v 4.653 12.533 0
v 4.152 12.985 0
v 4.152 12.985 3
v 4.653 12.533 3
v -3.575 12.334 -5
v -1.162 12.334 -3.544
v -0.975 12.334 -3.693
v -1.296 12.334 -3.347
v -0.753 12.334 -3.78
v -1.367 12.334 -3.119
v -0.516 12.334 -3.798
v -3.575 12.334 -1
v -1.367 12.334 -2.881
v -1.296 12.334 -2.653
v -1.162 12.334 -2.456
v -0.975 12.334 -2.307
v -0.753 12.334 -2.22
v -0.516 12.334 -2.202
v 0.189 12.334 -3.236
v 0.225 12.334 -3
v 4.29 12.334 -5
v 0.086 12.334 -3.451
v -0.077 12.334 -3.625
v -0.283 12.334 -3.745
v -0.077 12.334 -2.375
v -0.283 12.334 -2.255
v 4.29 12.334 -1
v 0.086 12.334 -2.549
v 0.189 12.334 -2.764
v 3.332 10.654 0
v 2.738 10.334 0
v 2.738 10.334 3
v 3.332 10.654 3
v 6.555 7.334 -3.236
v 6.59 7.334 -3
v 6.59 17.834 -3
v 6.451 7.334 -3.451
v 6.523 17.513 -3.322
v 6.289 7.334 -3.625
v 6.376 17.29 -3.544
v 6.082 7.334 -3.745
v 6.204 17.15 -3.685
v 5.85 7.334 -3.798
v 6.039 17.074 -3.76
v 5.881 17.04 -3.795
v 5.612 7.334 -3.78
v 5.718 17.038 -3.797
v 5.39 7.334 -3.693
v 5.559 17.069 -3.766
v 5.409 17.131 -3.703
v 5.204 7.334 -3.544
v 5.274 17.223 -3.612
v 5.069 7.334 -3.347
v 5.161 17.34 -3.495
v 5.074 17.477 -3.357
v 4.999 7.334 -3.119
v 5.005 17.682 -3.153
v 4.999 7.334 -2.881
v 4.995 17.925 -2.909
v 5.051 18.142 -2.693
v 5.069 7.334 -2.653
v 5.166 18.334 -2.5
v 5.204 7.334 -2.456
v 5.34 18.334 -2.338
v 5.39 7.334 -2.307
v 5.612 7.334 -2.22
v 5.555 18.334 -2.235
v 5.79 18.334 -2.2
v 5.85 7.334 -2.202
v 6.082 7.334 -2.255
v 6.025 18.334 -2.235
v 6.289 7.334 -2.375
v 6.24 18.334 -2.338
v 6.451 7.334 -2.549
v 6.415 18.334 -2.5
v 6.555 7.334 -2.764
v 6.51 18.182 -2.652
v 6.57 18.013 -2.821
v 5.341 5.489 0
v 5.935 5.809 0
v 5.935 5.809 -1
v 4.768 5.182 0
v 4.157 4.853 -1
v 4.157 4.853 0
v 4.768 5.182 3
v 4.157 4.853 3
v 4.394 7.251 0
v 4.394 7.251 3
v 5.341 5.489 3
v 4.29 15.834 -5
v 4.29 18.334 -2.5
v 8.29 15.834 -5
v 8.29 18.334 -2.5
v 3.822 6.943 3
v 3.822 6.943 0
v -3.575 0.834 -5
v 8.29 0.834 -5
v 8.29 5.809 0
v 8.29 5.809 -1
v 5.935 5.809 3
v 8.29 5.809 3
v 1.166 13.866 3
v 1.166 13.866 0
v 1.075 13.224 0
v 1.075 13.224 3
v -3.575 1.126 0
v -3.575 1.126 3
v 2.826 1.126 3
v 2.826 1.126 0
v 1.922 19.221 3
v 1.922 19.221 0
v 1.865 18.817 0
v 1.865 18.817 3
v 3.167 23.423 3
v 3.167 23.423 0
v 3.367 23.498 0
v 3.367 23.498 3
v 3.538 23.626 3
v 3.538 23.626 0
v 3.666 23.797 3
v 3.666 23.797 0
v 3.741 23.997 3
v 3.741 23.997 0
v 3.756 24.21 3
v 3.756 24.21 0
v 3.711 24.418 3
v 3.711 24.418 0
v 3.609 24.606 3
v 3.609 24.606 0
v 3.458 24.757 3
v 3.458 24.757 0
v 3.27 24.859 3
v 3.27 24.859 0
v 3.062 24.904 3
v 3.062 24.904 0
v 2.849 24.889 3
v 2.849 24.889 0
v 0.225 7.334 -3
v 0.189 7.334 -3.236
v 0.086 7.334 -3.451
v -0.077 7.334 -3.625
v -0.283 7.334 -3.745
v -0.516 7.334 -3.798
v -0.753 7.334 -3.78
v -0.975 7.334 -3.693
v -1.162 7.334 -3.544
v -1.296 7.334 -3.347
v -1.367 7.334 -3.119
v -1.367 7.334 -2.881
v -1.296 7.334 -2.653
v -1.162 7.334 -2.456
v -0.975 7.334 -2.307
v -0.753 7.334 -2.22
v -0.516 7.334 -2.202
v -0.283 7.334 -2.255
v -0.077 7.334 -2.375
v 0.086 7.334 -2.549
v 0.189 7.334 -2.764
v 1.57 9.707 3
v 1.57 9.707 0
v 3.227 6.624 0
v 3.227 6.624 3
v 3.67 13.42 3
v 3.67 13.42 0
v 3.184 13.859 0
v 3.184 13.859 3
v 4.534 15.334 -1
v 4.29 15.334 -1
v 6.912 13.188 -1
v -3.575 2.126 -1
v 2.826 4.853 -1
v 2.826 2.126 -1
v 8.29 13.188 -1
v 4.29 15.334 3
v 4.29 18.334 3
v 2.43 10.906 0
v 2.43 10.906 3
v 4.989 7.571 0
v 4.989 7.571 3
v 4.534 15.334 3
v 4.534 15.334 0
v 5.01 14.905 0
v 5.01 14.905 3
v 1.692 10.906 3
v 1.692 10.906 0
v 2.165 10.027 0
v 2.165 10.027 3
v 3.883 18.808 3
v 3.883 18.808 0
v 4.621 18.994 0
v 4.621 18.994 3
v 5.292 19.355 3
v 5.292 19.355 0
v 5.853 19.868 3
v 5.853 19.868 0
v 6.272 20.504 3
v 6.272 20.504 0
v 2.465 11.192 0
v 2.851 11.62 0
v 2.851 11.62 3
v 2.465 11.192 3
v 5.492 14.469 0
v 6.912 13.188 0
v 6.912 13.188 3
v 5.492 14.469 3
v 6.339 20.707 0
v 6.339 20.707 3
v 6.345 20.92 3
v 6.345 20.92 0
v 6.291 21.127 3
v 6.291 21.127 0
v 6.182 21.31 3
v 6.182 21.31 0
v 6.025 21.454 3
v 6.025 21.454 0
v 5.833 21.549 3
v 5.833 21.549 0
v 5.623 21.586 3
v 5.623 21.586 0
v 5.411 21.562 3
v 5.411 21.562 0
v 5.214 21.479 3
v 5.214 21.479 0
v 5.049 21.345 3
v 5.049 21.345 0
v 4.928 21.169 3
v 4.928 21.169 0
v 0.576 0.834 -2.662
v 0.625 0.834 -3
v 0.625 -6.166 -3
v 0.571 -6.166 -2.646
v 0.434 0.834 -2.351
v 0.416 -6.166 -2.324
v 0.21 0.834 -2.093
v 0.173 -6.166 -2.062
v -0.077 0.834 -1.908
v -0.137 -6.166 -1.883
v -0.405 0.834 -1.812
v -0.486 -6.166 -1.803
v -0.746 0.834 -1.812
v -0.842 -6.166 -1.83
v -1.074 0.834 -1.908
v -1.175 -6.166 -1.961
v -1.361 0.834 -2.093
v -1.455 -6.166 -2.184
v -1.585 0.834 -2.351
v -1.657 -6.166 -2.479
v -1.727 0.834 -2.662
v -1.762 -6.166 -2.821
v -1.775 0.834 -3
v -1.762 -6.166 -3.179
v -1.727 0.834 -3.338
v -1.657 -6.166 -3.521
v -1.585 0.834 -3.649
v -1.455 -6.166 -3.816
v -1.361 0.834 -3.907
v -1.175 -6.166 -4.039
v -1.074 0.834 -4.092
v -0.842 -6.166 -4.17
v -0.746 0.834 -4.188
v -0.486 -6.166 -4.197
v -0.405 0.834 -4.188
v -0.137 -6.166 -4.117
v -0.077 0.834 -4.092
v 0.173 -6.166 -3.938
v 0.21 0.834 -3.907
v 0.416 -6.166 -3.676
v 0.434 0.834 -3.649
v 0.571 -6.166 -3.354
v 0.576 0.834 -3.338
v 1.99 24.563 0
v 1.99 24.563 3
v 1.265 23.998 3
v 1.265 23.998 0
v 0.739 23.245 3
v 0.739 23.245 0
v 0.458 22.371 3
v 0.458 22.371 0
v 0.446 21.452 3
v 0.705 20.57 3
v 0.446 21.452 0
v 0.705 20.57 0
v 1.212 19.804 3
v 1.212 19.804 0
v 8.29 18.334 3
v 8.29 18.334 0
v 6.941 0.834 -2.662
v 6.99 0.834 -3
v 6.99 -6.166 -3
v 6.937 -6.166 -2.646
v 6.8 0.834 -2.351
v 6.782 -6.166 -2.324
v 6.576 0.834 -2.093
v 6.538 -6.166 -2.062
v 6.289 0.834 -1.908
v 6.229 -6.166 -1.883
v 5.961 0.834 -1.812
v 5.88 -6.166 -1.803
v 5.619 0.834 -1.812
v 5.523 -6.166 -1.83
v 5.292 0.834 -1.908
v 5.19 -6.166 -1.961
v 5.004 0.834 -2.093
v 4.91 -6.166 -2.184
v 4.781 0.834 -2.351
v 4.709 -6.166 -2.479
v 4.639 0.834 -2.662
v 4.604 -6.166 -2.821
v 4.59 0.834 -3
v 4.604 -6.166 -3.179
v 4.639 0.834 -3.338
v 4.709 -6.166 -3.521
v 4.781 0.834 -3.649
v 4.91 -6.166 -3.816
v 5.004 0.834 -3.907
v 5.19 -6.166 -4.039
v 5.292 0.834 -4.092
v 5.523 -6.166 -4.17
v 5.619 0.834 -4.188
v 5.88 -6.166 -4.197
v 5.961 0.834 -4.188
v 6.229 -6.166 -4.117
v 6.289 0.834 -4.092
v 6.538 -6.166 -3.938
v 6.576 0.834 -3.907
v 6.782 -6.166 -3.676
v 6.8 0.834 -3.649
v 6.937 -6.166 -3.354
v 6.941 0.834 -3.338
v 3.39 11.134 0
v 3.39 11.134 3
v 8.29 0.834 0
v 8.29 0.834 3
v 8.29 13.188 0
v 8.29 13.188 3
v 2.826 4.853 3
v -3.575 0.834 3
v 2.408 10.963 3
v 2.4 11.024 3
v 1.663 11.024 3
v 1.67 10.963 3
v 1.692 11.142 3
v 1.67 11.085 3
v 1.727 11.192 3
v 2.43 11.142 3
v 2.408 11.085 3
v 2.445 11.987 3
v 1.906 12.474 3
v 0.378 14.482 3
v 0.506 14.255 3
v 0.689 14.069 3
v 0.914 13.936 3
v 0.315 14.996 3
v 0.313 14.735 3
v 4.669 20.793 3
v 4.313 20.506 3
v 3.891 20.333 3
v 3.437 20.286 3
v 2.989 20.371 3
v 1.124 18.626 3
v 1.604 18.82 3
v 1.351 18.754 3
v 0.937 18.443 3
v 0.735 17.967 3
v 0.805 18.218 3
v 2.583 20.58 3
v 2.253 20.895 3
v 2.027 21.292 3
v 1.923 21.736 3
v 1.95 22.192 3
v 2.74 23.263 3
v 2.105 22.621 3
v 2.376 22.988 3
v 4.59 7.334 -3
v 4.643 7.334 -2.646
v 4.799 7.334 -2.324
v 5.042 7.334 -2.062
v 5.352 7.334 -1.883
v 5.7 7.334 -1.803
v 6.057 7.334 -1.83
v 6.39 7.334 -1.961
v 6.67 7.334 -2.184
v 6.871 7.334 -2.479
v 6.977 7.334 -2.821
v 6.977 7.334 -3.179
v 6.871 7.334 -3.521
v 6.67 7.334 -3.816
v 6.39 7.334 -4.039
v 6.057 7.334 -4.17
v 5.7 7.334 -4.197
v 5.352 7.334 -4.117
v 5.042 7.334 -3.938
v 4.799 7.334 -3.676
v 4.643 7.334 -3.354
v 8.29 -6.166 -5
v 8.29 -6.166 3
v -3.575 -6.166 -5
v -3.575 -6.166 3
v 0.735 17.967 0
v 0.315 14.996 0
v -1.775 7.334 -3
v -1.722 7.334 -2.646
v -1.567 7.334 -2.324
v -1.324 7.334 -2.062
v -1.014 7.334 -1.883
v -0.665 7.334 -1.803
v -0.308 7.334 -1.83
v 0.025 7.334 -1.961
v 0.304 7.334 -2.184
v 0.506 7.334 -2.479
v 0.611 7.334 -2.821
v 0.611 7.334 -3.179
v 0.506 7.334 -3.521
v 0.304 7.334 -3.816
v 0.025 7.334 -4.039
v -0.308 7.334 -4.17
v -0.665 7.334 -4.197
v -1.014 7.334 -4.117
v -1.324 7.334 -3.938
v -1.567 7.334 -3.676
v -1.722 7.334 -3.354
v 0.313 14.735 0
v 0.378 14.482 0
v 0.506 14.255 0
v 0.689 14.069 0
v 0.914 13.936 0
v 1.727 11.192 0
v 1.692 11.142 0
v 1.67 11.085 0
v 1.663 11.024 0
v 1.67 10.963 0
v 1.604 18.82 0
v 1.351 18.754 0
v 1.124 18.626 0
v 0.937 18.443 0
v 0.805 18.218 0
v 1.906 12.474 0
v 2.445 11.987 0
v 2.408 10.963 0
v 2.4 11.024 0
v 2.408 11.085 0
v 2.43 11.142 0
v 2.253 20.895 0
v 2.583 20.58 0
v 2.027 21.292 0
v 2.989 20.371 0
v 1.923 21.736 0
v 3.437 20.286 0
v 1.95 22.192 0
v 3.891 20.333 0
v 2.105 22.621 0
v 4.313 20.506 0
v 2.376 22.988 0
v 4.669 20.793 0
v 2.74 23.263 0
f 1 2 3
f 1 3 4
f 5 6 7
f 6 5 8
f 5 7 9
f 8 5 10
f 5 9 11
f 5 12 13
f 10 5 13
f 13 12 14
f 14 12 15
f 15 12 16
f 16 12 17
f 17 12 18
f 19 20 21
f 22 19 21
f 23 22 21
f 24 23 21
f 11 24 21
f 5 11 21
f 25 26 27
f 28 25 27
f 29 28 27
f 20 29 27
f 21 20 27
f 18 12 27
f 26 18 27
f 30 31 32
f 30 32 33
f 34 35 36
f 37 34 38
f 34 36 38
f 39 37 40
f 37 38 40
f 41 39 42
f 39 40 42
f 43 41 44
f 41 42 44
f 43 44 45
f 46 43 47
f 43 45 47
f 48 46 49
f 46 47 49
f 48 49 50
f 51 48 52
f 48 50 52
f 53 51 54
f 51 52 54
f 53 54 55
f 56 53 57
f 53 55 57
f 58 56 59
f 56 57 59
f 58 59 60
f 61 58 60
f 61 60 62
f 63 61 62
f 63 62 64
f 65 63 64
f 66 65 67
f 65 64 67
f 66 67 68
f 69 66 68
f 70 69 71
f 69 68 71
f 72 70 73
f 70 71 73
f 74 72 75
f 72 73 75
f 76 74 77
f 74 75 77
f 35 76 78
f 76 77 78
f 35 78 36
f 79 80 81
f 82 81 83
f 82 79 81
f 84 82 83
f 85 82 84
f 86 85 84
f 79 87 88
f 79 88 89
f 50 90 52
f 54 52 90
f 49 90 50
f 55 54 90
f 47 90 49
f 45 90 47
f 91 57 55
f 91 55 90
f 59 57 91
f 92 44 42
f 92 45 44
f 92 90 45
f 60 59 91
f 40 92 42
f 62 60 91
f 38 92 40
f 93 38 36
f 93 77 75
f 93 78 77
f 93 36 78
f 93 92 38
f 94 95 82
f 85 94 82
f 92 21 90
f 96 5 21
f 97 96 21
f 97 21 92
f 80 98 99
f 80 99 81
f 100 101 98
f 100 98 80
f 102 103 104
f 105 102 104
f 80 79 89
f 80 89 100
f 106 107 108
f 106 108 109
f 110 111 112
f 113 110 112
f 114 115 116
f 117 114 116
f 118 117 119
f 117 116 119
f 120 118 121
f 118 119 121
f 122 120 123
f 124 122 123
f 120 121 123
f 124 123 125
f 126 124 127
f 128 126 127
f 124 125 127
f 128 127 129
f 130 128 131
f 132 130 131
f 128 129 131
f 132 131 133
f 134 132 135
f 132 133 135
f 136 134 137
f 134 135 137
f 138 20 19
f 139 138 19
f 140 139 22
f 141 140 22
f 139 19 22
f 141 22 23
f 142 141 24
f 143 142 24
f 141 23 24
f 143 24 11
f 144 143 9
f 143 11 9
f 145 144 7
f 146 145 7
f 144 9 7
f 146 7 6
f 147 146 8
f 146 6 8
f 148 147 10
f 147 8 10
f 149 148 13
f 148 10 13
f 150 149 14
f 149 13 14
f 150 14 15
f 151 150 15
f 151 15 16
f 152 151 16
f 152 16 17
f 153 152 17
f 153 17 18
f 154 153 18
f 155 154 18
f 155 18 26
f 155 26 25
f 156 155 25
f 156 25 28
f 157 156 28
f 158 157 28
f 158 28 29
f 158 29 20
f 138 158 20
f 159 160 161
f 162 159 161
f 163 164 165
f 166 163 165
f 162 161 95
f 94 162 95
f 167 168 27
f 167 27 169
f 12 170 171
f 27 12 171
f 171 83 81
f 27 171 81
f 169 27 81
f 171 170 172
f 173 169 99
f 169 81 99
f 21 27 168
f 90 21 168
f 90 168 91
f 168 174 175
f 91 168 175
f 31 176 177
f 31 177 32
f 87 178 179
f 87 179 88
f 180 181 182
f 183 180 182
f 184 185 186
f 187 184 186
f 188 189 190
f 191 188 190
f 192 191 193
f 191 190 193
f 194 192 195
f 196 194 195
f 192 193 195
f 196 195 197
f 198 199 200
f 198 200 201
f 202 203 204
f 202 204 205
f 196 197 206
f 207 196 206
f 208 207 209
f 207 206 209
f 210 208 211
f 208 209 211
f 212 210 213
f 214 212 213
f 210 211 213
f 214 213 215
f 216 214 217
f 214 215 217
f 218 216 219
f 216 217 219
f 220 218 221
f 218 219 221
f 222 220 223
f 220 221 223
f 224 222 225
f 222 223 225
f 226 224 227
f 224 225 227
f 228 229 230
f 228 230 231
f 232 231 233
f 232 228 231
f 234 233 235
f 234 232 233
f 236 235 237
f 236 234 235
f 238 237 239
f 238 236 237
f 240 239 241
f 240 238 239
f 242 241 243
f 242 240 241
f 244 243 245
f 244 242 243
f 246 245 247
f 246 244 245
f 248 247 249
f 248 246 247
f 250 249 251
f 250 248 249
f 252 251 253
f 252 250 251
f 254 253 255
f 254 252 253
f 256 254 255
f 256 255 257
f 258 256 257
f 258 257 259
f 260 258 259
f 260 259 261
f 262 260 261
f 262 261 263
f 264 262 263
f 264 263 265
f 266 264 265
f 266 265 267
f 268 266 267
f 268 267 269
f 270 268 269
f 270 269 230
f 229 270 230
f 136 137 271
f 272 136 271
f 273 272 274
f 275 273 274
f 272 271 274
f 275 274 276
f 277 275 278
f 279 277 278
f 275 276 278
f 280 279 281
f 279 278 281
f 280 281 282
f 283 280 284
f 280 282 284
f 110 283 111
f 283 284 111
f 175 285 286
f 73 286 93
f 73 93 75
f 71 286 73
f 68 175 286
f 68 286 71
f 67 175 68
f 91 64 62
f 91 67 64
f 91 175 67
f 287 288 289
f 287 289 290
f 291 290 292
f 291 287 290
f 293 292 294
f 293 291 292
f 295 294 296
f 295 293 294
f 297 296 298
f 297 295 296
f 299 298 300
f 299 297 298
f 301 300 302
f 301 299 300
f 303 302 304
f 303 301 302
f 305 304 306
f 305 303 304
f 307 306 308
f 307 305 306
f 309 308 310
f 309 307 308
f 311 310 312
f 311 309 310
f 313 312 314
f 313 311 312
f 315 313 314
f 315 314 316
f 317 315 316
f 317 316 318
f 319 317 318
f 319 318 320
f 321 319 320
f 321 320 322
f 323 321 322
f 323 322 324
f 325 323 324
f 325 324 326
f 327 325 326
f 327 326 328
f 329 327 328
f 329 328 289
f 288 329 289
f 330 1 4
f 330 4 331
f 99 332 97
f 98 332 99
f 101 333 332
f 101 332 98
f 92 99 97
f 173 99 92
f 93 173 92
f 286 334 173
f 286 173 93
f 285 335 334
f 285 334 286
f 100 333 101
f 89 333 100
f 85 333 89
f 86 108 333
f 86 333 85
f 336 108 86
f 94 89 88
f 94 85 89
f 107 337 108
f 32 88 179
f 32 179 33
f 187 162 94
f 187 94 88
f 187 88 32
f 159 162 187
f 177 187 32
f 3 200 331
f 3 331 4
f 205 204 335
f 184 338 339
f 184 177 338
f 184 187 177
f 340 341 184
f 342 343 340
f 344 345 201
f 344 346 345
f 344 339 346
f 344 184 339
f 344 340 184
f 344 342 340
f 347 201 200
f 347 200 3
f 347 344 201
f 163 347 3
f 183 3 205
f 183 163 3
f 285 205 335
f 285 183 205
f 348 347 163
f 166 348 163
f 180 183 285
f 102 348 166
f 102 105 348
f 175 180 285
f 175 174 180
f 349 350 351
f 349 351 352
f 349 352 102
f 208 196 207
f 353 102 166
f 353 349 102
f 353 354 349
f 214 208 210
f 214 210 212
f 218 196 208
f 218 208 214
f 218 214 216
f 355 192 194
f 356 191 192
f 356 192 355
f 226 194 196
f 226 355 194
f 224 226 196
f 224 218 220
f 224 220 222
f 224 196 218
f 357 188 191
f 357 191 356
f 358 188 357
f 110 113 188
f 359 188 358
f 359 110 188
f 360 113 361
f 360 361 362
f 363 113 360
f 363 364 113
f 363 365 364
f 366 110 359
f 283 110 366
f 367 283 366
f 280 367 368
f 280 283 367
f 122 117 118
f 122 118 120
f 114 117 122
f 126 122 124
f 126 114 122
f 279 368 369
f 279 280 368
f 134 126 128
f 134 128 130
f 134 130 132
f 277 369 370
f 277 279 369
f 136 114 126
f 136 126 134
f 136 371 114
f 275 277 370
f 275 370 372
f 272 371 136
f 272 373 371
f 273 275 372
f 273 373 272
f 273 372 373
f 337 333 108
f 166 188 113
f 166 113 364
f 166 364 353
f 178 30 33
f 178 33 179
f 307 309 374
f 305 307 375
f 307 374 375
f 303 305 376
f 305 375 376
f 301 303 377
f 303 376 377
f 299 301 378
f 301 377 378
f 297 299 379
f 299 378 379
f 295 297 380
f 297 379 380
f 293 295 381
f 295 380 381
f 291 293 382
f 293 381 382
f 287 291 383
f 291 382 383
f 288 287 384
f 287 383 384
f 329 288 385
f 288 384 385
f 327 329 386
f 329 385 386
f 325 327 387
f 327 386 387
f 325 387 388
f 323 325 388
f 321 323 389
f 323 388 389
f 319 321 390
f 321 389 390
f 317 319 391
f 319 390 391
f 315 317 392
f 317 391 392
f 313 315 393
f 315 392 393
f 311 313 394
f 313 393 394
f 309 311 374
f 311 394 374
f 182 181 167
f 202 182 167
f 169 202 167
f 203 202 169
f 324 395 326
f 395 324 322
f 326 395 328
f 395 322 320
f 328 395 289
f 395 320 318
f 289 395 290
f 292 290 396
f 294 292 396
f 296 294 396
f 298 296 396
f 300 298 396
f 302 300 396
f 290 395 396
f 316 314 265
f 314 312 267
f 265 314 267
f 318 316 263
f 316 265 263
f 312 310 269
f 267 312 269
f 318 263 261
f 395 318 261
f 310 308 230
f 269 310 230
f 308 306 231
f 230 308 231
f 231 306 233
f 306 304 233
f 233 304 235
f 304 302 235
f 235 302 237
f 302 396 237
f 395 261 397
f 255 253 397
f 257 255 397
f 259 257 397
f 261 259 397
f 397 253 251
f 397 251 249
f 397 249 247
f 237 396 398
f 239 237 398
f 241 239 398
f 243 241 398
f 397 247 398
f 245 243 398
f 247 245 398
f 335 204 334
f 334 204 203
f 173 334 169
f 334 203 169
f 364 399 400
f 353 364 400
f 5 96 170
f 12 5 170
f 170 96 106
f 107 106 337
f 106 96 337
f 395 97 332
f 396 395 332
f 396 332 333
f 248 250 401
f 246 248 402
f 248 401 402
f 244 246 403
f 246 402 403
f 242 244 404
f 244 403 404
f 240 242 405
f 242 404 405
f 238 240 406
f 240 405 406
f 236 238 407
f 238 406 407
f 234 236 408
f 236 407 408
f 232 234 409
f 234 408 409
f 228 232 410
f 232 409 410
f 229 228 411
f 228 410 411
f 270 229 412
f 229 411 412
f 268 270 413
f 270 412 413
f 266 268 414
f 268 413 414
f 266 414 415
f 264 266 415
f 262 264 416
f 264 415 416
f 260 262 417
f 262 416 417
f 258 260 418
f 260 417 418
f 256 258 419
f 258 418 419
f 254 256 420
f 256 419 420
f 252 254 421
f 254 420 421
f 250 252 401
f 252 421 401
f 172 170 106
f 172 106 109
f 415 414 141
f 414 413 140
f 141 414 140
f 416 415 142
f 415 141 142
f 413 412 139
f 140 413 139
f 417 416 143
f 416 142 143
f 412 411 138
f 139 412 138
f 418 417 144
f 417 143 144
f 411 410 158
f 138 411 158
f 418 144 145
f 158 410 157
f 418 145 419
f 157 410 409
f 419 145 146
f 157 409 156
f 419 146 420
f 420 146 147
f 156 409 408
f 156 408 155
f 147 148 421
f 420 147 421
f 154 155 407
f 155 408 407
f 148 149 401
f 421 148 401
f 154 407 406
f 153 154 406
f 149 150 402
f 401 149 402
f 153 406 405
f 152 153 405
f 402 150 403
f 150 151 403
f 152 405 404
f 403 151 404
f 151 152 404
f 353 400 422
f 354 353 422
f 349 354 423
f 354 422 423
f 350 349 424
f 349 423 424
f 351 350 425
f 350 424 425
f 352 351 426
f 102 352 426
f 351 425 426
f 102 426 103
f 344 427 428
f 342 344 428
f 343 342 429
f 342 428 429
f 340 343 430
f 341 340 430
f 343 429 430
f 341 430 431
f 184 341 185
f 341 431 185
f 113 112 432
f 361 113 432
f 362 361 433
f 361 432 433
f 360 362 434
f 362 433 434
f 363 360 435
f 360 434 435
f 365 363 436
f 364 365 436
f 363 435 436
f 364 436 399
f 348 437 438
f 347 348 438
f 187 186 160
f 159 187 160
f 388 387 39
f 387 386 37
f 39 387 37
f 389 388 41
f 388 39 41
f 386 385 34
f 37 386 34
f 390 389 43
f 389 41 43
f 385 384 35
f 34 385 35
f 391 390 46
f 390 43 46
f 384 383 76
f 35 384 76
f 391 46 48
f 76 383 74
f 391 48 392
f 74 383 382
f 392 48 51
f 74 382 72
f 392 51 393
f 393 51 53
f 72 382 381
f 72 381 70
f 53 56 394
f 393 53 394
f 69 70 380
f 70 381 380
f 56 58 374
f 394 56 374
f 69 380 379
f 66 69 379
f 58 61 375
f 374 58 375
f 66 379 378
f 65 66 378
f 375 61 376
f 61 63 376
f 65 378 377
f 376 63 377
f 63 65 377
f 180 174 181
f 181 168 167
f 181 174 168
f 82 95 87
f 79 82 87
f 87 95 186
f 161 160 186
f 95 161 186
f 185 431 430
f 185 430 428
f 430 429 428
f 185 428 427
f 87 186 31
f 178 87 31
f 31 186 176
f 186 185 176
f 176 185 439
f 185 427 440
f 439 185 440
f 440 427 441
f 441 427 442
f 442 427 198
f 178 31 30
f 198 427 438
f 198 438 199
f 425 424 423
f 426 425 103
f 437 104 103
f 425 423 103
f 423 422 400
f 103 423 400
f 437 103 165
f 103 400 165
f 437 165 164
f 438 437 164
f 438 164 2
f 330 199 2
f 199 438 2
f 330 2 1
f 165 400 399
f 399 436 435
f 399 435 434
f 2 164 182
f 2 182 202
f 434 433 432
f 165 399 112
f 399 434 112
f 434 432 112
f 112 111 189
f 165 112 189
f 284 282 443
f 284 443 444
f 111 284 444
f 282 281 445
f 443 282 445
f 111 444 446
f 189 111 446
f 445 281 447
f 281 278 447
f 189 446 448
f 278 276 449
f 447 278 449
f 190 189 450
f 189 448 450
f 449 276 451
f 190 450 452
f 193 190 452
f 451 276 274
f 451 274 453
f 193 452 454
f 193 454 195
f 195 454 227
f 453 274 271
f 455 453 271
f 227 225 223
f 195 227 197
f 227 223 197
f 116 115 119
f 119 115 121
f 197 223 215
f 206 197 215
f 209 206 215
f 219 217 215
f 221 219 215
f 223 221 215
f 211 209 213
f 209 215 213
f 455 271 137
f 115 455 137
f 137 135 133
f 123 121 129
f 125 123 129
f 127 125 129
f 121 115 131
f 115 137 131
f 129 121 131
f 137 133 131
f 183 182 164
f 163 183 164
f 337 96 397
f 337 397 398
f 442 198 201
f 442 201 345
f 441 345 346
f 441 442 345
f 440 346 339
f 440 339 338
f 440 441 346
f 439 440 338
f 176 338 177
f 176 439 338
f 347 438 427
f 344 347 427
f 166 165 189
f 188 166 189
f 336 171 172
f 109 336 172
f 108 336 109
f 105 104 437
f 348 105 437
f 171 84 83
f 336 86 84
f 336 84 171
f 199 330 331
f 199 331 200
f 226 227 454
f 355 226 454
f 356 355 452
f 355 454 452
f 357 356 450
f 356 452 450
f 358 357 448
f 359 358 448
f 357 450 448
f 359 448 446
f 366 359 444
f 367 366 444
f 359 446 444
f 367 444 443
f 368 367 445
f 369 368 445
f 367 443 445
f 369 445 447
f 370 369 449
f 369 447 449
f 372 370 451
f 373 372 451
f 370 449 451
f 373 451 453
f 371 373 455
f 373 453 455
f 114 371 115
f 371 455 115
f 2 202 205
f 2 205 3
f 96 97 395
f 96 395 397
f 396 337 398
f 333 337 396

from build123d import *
from build123d.topology import SkipClean

# Parameters (mm, degrees)
BOSS_SWITCH_BODY_DEPTH        = 3
SKETCH1_W                     = 4
SKETCH1_H                     = 5.146726578
BOSS_FLANGE_WIDTH_DEPTH       = 5
BOSS_FLANGE_HEIGHT_REACH      = 32.536
SKETCH2_W                     = 4
SKETCH2_H                     = 5.146726578
SKETCH2_W_2                   = 8
SKETCH2_H_2                   = 0.29195361
SKETCH17_W                    = 11.865577264
SKETCH17_H                    = 4
BOSS_FLANGE_SUPPORT_DEPTH     = 12.061319812
CUT_WALL_GAP_DEPTH            = 1
SKETCH26_W                    = 7.865577264
SKETCH26_H                    = 6
CUT_CAM_SLOPE_CLEARANCE_DEPTH = 29.549094119
TAP_DRILL_FOR_M2X0_4_TAP1_D   = 1.6
M2_CLEARANCE_HOLE2_D          = 2.4
M2_CLEARANCE_HOLE2_DEPTH      = 6.5
CHAMFER_FLANGE_SUPPORT_3_SIZE = 1
SKETCH25_W                    = 5.078666947
SKETCH25_H                    = 17.5
CUT_BASE_REMOVAL_DEPTH        = 3
CHAMFER8_SIZE                 = 2.5
SKETCH28_R                    = 1.2
BOSS_REAR_FILL_DEPTH          = 7


with BuildPart() as part:
    # Sketch-SwitchBossUp → Boss-Switch Body (new body)
    with BuildSketch(Plane.XY):
        with BuildLine():
            Line((1.921762003, 19.221250523), (1.86470337, 18.817184497))
            ThreePointArc((1.86470337, 18.817184497), (1.123589449, 18.626039018), (0.734703034, 17.966832076))
            Line((0.734703034, 17.966832076), (0.315231161, 14.996302939))
            ThreePointArc((0.315231161, 14.996302939), (0.506376639, 14.255189019), (1.165583582, 13.866302603))
            Line((1.165583582, 13.866302603), (1.074853013, 13.223785628))
            Line((1.074853013, 13.223785628), (1.905726754, 12.473719244))
            Line((1.905726754, 12.473719244), (2.444726799, 11.987140122))
            Line((2.444726799, 11.987140122), (1.726981331, 11.192069347))
            ThreePointArc((1.726981331, 11.192069347), (1.664368515, 11.054634089), (1.692327837, 10.906218823))
            Line((1.692327837, 10.906218823), (2.164939967, 10.026628353))
            Line((2.164939967, 10.026628353), (1.570336216, 9.707142235))
            Line((1.570336216, 9.707142235), (3.226930905, 6.624011677))
            Line((3.226930905, 6.624011677), (3.821534656, 6.943497796))
            Line((3.821534656, 6.943497796), (4.768160192, 5.181708905))
            Line((4.768160192, 5.181708905), (4.157214411, 4.853442062))
            Line((4.157214411, 4.853442062), (2.82580452, 4.853442062))
            Line((2.82580452, 4.853442062), (2.82580452, 4.353442062))
            Line((2.82580452, 4.353442062), (2.82580452, 1.126380759))
            Line((2.82580452, 1.126380759), (3.260297574, 1.126380759))
            Line((3.260297574, 1.126380759), (3.260297574, 0.834427149))
            Line((3.260297574, 0.834427149), (5.219466869, 0.834427149))
            Line((5.219466869, 0.834427149), (13.368774055, 0.834427149))
            Line((13.368774055, 0.834427149), (13.368774055, 18.334427149))
            Line((13.368774055, 18.334427149), (7.056733116, 18.334427149))
            Line((7.056733116, 18.334427149), (4.290107108, 18.334427149))
            Line((4.290107108, 18.334427149), (4.290107108, 15.334427149))
            Line((4.290107108, 15.334427149), (4.534260481, 15.334427149))
            Line((4.534260481, 15.334427149), (5.009929091, 14.905020107))
            Line((5.009929091, 14.905020107), (3.669750435, 13.420459172))
            Line((3.669750435, 13.420459172), (3.184345862, 13.858655297))
            Line((3.184345862, 13.858655297), (3.88324993, 18.808009555))
            ThreePointArc((3.88324993, 18.808009555), (5.291733051, 19.354544283), (6.272283418, 20.503911887))
            ThreePointArc((6.272283418, 20.503911887), (5.932330877, 21.508616953), (4.927625811, 21.168664412))
            ThreePointArc((4.927625811, 21.168664412), (2.253195858, 20.895301387), (3.167340926, 23.423471024))
            ThreePointArc((3.167340926, 23.423471024), (3.740925778, 24.315659579), (2.848737223, 24.889244431))
            ThreePointArc((2.848737223, 24.889244431), (0.457510485, 22.370520646), (1.921762003, 19.221250523))
        make_face()
        with BuildLine():
            Line((6.935345332, 5.808848323), (10.437466736, 5.808848323))
            Line((10.437466736, 5.808848323), (10.437466736, 13.187700571))
            Line((10.437466736, 13.187700571), (6.912261653, 13.187700571))
            Line((6.912261653, 13.187700571), (5.492411395, 14.469462044))
            Line((5.492411395, 14.469462044), (4.152232739, 12.984901109))
            Line((4.152232739, 12.984901109), (4.653272054, 12.532590813))
            Line((4.653272054, 12.532590813), (3.390287689, 11.133540588))
            Line((3.390287689, 11.133540588), (2.851287644, 11.620119709))
            Line((2.851287644, 11.620119709), (2.464867696, 11.192069347))
            ThreePointArc((2.464867696, 11.192069347), (2.40225488, 11.054634089), (2.430214202, 10.906218823))
            Line((2.430214202, 10.906218823), (2.737521356, 10.334281653))
            Line((2.737521356, 10.334281653), (3.332125106, 10.653767771))
            Line((3.332125106, 10.653767771), (4.988719795, 7.570637214))
            Line((4.988719795, 7.570637214), (4.394116045, 7.251151095))
            Line((4.394116045, 7.251151095), (5.340741582, 5.489362205))
            Line((5.340741582, 5.489362205), (5.935345332, 5.808848323))
            Line((5.935345332, 5.808848323), (6.935345332, 5.808848323))
        make_face(mode=Mode.SUBTRACT)
    extrude(amount=BOSS_SWITCH_BODY_DEPTH)

    # Sketch1 → Boss-Flange Width (add)
    with BuildSketch(Plane(origin=(0, 0, 0), x_dir=(-1, 0, 0), z_dir=(0, 0, -1))):
        Polygon((-8.290107108, 5.808848323), (-5.935345332, 5.808848323), (-4.157214411, 4.853442062), (-2.82580452, 4.853442062), (-2.82580452, 1.126380759), (0.412170615, 1.126380759), (0.412170615, 0.834427149), (-8.290107108, 0.834427149), (-8.290107108, 1.426550232), align=None)
        with Locations((-6.290107108, 15.76106386)):
            Rectangle(SKETCH1_W, SKETCH1_H)
    extrude(amount=BOSS_FLANGE_WIDTH_DEPTH)

    # Sketch2 → Boss-Flange Height (add, up to next)
    with BuildSketch(Plane(origin=(-3.575470156, 0, 0), x_dir=(0, 0, -1), z_dir=(1, 0, 0)), mode=Mode.PRIVATE) as boss_flange_height_sk1:
        with Locations((3, 15.76106386)):
            Rectangle(SKETCH2_W, SKETCH2_H)
    boss_flange_height_tool1 = extrude(boss_flange_height_sk1.sketch, amount=BOSS_FLANGE_HEIGHT_REACH, mode=Mode.PRIVATE) - part.part
    # Sketch2 → Boss-Flange Height (add, up to next)
    with BuildSketch(Plane(origin=(-3.575470156, 0, 0), x_dir=(0, 0, -1), z_dir=(1, 0, 0)), mode=Mode.PRIVATE) as boss_flange_height_sk2:
        with Locations((1, 0.980403954)):
            Rectangle(SKETCH2_W_2, SKETCH2_H_2)
    boss_flange_height_tool2 = extrude(boss_flange_height_sk2.sketch, amount=BOSS_FLANGE_HEIGHT_REACH, mode=Mode.PRIVATE) - part.part
    add(boss_flange_height_tool1.solids().sort_by_distance((-3.57547, 15.761064, -3))[0])
    add(boss_flange_height_tool2.solids().sort_by_distance((-3.57547, 0.980404, -1))[0])

    # Sketch17 → Boss-Flange Support (add)
    with BuildSketch(Plane.XZ.offset(-1.126380759)):
        with Locations((2.357318476, -3)):
            Rectangle(SKETCH17_W, SKETCH17_H)
    extrude(amount=-BOSS_FLANGE_SUPPORT_DEPTH)

    # Sketch27 → Cut-Wall Gap (cut)
    with BuildSketch(Plane.XY):
        Polygon((4.290107108, 15.334427149), (4.534260481, 15.334427149), (6.912261653, 13.187700571), (4.290107108, 13.187700571), align=None)
    extrude(amount=-CUT_WALL_GAP_DEPTH, mode=Mode.SUBTRACT)

    # Sketch26 → Cut-Cam Slope Clearance (cut, through all)
    with BuildSketch(Plane.XY.offset(-1)):
        with Locations((0.357318476, 15.334427149)):
            Rectangle(SKETCH26_W, SKETCH26_H)
    extrude(amount=-CUT_CAM_SLOPE_CLEARANCE_DEPTH, mode=Mode.SUBTRACT)

    # Tap Drill for M2x0.4 Tap1 (through all)
    with Locations(Plane(origin=(0, 0.834427149, 0), x_dir=(-1, 0, 0), z_dir=(0, -1, 0))):
        with Locations((0.575470156, 3), (-5.790107108, 3)):
            Hole(TAP_DRILL_FOR_M2X0_4_TAP1_D / 2)

    # M2 Clearance Hole2
    with Locations(Plane.XZ.offset(-0.834427149)):
        with Locations((-0.575470156, -3), (5.790107108, -3)):
            Hole(M2_CLEARANCE_HOLE2_D / 2, depth=M2_CLEARANCE_HOLE2_DEPTH)

    # Chamfer-Flange Support 3
    chamfer_flange_support_3_edges = [part.edges().sort_by_distance(p)[0] for p in [
        (-0.374832818, 1.126380759, -1),
    ]]
    chamfer(chamfer_flange_support_3_edges, length=CHAMFER_FLANGE_SUPPORT_3_SIZE)

    # Sketch25 → Cut-Base Removal (cut)
    with BuildSketch(Plane.XY.offset(3)):
        with Locations((10.829440582, 9.584427149)):
            Rectangle(SKETCH25_W, SKETCH25_H)
    extrude(amount=-CUT_BASE_REMOVAL_DEPTH, mode=Mode.SUBTRACT)

    # Chamfer8
    # the kernel refuses this chamfer: 2.5 mm, written as the material it takes off along each edge
    with BuildSketch(Plane(origin=(14.719314578, 18.334427149, -5), x_dir=(0, -0.9996219169112968, -0.027495876610586317), z_dir=(-1, 0, 0))) as chamfer8_piece_1:
        Polygon((CHAMFER8_SIZE * 0.999621916911, CHAMFER8_SIZE * 0.0274958766106), (-CHAMFER8_SIZE * 0.0274958766106, CHAMFER8_SIZE * 0.999621916911), (0, 0), align=None)
    extrude(amount=16.85841494, mode=Mode.SUBTRACT)

    # Sketch28 → Boss-Rear Fill (add)
    with SkipClean():  # the faces are left unmerged after this step: merging them gives an invalid solid
        with BuildSketch(Plane.XZ.offset(-0.834427149)):
            Polygon((-3.575470156, 3), (8.290107108, 3), (8.290107108, 0), (8.290107108, -5), (-3.575470156, -5), align=None)
            with Locations((5.790107108, -3)):
                Circle(SKETCH28_R, mode=Mode.SUBTRACT)
            with Locations((-0.575470156, -3)):
                Circle(SKETCH28_R, mode=Mode.SUBTRACT)
        extrude(amount=BOSS_REAR_FILL_DEPTH)


solid = part.part
